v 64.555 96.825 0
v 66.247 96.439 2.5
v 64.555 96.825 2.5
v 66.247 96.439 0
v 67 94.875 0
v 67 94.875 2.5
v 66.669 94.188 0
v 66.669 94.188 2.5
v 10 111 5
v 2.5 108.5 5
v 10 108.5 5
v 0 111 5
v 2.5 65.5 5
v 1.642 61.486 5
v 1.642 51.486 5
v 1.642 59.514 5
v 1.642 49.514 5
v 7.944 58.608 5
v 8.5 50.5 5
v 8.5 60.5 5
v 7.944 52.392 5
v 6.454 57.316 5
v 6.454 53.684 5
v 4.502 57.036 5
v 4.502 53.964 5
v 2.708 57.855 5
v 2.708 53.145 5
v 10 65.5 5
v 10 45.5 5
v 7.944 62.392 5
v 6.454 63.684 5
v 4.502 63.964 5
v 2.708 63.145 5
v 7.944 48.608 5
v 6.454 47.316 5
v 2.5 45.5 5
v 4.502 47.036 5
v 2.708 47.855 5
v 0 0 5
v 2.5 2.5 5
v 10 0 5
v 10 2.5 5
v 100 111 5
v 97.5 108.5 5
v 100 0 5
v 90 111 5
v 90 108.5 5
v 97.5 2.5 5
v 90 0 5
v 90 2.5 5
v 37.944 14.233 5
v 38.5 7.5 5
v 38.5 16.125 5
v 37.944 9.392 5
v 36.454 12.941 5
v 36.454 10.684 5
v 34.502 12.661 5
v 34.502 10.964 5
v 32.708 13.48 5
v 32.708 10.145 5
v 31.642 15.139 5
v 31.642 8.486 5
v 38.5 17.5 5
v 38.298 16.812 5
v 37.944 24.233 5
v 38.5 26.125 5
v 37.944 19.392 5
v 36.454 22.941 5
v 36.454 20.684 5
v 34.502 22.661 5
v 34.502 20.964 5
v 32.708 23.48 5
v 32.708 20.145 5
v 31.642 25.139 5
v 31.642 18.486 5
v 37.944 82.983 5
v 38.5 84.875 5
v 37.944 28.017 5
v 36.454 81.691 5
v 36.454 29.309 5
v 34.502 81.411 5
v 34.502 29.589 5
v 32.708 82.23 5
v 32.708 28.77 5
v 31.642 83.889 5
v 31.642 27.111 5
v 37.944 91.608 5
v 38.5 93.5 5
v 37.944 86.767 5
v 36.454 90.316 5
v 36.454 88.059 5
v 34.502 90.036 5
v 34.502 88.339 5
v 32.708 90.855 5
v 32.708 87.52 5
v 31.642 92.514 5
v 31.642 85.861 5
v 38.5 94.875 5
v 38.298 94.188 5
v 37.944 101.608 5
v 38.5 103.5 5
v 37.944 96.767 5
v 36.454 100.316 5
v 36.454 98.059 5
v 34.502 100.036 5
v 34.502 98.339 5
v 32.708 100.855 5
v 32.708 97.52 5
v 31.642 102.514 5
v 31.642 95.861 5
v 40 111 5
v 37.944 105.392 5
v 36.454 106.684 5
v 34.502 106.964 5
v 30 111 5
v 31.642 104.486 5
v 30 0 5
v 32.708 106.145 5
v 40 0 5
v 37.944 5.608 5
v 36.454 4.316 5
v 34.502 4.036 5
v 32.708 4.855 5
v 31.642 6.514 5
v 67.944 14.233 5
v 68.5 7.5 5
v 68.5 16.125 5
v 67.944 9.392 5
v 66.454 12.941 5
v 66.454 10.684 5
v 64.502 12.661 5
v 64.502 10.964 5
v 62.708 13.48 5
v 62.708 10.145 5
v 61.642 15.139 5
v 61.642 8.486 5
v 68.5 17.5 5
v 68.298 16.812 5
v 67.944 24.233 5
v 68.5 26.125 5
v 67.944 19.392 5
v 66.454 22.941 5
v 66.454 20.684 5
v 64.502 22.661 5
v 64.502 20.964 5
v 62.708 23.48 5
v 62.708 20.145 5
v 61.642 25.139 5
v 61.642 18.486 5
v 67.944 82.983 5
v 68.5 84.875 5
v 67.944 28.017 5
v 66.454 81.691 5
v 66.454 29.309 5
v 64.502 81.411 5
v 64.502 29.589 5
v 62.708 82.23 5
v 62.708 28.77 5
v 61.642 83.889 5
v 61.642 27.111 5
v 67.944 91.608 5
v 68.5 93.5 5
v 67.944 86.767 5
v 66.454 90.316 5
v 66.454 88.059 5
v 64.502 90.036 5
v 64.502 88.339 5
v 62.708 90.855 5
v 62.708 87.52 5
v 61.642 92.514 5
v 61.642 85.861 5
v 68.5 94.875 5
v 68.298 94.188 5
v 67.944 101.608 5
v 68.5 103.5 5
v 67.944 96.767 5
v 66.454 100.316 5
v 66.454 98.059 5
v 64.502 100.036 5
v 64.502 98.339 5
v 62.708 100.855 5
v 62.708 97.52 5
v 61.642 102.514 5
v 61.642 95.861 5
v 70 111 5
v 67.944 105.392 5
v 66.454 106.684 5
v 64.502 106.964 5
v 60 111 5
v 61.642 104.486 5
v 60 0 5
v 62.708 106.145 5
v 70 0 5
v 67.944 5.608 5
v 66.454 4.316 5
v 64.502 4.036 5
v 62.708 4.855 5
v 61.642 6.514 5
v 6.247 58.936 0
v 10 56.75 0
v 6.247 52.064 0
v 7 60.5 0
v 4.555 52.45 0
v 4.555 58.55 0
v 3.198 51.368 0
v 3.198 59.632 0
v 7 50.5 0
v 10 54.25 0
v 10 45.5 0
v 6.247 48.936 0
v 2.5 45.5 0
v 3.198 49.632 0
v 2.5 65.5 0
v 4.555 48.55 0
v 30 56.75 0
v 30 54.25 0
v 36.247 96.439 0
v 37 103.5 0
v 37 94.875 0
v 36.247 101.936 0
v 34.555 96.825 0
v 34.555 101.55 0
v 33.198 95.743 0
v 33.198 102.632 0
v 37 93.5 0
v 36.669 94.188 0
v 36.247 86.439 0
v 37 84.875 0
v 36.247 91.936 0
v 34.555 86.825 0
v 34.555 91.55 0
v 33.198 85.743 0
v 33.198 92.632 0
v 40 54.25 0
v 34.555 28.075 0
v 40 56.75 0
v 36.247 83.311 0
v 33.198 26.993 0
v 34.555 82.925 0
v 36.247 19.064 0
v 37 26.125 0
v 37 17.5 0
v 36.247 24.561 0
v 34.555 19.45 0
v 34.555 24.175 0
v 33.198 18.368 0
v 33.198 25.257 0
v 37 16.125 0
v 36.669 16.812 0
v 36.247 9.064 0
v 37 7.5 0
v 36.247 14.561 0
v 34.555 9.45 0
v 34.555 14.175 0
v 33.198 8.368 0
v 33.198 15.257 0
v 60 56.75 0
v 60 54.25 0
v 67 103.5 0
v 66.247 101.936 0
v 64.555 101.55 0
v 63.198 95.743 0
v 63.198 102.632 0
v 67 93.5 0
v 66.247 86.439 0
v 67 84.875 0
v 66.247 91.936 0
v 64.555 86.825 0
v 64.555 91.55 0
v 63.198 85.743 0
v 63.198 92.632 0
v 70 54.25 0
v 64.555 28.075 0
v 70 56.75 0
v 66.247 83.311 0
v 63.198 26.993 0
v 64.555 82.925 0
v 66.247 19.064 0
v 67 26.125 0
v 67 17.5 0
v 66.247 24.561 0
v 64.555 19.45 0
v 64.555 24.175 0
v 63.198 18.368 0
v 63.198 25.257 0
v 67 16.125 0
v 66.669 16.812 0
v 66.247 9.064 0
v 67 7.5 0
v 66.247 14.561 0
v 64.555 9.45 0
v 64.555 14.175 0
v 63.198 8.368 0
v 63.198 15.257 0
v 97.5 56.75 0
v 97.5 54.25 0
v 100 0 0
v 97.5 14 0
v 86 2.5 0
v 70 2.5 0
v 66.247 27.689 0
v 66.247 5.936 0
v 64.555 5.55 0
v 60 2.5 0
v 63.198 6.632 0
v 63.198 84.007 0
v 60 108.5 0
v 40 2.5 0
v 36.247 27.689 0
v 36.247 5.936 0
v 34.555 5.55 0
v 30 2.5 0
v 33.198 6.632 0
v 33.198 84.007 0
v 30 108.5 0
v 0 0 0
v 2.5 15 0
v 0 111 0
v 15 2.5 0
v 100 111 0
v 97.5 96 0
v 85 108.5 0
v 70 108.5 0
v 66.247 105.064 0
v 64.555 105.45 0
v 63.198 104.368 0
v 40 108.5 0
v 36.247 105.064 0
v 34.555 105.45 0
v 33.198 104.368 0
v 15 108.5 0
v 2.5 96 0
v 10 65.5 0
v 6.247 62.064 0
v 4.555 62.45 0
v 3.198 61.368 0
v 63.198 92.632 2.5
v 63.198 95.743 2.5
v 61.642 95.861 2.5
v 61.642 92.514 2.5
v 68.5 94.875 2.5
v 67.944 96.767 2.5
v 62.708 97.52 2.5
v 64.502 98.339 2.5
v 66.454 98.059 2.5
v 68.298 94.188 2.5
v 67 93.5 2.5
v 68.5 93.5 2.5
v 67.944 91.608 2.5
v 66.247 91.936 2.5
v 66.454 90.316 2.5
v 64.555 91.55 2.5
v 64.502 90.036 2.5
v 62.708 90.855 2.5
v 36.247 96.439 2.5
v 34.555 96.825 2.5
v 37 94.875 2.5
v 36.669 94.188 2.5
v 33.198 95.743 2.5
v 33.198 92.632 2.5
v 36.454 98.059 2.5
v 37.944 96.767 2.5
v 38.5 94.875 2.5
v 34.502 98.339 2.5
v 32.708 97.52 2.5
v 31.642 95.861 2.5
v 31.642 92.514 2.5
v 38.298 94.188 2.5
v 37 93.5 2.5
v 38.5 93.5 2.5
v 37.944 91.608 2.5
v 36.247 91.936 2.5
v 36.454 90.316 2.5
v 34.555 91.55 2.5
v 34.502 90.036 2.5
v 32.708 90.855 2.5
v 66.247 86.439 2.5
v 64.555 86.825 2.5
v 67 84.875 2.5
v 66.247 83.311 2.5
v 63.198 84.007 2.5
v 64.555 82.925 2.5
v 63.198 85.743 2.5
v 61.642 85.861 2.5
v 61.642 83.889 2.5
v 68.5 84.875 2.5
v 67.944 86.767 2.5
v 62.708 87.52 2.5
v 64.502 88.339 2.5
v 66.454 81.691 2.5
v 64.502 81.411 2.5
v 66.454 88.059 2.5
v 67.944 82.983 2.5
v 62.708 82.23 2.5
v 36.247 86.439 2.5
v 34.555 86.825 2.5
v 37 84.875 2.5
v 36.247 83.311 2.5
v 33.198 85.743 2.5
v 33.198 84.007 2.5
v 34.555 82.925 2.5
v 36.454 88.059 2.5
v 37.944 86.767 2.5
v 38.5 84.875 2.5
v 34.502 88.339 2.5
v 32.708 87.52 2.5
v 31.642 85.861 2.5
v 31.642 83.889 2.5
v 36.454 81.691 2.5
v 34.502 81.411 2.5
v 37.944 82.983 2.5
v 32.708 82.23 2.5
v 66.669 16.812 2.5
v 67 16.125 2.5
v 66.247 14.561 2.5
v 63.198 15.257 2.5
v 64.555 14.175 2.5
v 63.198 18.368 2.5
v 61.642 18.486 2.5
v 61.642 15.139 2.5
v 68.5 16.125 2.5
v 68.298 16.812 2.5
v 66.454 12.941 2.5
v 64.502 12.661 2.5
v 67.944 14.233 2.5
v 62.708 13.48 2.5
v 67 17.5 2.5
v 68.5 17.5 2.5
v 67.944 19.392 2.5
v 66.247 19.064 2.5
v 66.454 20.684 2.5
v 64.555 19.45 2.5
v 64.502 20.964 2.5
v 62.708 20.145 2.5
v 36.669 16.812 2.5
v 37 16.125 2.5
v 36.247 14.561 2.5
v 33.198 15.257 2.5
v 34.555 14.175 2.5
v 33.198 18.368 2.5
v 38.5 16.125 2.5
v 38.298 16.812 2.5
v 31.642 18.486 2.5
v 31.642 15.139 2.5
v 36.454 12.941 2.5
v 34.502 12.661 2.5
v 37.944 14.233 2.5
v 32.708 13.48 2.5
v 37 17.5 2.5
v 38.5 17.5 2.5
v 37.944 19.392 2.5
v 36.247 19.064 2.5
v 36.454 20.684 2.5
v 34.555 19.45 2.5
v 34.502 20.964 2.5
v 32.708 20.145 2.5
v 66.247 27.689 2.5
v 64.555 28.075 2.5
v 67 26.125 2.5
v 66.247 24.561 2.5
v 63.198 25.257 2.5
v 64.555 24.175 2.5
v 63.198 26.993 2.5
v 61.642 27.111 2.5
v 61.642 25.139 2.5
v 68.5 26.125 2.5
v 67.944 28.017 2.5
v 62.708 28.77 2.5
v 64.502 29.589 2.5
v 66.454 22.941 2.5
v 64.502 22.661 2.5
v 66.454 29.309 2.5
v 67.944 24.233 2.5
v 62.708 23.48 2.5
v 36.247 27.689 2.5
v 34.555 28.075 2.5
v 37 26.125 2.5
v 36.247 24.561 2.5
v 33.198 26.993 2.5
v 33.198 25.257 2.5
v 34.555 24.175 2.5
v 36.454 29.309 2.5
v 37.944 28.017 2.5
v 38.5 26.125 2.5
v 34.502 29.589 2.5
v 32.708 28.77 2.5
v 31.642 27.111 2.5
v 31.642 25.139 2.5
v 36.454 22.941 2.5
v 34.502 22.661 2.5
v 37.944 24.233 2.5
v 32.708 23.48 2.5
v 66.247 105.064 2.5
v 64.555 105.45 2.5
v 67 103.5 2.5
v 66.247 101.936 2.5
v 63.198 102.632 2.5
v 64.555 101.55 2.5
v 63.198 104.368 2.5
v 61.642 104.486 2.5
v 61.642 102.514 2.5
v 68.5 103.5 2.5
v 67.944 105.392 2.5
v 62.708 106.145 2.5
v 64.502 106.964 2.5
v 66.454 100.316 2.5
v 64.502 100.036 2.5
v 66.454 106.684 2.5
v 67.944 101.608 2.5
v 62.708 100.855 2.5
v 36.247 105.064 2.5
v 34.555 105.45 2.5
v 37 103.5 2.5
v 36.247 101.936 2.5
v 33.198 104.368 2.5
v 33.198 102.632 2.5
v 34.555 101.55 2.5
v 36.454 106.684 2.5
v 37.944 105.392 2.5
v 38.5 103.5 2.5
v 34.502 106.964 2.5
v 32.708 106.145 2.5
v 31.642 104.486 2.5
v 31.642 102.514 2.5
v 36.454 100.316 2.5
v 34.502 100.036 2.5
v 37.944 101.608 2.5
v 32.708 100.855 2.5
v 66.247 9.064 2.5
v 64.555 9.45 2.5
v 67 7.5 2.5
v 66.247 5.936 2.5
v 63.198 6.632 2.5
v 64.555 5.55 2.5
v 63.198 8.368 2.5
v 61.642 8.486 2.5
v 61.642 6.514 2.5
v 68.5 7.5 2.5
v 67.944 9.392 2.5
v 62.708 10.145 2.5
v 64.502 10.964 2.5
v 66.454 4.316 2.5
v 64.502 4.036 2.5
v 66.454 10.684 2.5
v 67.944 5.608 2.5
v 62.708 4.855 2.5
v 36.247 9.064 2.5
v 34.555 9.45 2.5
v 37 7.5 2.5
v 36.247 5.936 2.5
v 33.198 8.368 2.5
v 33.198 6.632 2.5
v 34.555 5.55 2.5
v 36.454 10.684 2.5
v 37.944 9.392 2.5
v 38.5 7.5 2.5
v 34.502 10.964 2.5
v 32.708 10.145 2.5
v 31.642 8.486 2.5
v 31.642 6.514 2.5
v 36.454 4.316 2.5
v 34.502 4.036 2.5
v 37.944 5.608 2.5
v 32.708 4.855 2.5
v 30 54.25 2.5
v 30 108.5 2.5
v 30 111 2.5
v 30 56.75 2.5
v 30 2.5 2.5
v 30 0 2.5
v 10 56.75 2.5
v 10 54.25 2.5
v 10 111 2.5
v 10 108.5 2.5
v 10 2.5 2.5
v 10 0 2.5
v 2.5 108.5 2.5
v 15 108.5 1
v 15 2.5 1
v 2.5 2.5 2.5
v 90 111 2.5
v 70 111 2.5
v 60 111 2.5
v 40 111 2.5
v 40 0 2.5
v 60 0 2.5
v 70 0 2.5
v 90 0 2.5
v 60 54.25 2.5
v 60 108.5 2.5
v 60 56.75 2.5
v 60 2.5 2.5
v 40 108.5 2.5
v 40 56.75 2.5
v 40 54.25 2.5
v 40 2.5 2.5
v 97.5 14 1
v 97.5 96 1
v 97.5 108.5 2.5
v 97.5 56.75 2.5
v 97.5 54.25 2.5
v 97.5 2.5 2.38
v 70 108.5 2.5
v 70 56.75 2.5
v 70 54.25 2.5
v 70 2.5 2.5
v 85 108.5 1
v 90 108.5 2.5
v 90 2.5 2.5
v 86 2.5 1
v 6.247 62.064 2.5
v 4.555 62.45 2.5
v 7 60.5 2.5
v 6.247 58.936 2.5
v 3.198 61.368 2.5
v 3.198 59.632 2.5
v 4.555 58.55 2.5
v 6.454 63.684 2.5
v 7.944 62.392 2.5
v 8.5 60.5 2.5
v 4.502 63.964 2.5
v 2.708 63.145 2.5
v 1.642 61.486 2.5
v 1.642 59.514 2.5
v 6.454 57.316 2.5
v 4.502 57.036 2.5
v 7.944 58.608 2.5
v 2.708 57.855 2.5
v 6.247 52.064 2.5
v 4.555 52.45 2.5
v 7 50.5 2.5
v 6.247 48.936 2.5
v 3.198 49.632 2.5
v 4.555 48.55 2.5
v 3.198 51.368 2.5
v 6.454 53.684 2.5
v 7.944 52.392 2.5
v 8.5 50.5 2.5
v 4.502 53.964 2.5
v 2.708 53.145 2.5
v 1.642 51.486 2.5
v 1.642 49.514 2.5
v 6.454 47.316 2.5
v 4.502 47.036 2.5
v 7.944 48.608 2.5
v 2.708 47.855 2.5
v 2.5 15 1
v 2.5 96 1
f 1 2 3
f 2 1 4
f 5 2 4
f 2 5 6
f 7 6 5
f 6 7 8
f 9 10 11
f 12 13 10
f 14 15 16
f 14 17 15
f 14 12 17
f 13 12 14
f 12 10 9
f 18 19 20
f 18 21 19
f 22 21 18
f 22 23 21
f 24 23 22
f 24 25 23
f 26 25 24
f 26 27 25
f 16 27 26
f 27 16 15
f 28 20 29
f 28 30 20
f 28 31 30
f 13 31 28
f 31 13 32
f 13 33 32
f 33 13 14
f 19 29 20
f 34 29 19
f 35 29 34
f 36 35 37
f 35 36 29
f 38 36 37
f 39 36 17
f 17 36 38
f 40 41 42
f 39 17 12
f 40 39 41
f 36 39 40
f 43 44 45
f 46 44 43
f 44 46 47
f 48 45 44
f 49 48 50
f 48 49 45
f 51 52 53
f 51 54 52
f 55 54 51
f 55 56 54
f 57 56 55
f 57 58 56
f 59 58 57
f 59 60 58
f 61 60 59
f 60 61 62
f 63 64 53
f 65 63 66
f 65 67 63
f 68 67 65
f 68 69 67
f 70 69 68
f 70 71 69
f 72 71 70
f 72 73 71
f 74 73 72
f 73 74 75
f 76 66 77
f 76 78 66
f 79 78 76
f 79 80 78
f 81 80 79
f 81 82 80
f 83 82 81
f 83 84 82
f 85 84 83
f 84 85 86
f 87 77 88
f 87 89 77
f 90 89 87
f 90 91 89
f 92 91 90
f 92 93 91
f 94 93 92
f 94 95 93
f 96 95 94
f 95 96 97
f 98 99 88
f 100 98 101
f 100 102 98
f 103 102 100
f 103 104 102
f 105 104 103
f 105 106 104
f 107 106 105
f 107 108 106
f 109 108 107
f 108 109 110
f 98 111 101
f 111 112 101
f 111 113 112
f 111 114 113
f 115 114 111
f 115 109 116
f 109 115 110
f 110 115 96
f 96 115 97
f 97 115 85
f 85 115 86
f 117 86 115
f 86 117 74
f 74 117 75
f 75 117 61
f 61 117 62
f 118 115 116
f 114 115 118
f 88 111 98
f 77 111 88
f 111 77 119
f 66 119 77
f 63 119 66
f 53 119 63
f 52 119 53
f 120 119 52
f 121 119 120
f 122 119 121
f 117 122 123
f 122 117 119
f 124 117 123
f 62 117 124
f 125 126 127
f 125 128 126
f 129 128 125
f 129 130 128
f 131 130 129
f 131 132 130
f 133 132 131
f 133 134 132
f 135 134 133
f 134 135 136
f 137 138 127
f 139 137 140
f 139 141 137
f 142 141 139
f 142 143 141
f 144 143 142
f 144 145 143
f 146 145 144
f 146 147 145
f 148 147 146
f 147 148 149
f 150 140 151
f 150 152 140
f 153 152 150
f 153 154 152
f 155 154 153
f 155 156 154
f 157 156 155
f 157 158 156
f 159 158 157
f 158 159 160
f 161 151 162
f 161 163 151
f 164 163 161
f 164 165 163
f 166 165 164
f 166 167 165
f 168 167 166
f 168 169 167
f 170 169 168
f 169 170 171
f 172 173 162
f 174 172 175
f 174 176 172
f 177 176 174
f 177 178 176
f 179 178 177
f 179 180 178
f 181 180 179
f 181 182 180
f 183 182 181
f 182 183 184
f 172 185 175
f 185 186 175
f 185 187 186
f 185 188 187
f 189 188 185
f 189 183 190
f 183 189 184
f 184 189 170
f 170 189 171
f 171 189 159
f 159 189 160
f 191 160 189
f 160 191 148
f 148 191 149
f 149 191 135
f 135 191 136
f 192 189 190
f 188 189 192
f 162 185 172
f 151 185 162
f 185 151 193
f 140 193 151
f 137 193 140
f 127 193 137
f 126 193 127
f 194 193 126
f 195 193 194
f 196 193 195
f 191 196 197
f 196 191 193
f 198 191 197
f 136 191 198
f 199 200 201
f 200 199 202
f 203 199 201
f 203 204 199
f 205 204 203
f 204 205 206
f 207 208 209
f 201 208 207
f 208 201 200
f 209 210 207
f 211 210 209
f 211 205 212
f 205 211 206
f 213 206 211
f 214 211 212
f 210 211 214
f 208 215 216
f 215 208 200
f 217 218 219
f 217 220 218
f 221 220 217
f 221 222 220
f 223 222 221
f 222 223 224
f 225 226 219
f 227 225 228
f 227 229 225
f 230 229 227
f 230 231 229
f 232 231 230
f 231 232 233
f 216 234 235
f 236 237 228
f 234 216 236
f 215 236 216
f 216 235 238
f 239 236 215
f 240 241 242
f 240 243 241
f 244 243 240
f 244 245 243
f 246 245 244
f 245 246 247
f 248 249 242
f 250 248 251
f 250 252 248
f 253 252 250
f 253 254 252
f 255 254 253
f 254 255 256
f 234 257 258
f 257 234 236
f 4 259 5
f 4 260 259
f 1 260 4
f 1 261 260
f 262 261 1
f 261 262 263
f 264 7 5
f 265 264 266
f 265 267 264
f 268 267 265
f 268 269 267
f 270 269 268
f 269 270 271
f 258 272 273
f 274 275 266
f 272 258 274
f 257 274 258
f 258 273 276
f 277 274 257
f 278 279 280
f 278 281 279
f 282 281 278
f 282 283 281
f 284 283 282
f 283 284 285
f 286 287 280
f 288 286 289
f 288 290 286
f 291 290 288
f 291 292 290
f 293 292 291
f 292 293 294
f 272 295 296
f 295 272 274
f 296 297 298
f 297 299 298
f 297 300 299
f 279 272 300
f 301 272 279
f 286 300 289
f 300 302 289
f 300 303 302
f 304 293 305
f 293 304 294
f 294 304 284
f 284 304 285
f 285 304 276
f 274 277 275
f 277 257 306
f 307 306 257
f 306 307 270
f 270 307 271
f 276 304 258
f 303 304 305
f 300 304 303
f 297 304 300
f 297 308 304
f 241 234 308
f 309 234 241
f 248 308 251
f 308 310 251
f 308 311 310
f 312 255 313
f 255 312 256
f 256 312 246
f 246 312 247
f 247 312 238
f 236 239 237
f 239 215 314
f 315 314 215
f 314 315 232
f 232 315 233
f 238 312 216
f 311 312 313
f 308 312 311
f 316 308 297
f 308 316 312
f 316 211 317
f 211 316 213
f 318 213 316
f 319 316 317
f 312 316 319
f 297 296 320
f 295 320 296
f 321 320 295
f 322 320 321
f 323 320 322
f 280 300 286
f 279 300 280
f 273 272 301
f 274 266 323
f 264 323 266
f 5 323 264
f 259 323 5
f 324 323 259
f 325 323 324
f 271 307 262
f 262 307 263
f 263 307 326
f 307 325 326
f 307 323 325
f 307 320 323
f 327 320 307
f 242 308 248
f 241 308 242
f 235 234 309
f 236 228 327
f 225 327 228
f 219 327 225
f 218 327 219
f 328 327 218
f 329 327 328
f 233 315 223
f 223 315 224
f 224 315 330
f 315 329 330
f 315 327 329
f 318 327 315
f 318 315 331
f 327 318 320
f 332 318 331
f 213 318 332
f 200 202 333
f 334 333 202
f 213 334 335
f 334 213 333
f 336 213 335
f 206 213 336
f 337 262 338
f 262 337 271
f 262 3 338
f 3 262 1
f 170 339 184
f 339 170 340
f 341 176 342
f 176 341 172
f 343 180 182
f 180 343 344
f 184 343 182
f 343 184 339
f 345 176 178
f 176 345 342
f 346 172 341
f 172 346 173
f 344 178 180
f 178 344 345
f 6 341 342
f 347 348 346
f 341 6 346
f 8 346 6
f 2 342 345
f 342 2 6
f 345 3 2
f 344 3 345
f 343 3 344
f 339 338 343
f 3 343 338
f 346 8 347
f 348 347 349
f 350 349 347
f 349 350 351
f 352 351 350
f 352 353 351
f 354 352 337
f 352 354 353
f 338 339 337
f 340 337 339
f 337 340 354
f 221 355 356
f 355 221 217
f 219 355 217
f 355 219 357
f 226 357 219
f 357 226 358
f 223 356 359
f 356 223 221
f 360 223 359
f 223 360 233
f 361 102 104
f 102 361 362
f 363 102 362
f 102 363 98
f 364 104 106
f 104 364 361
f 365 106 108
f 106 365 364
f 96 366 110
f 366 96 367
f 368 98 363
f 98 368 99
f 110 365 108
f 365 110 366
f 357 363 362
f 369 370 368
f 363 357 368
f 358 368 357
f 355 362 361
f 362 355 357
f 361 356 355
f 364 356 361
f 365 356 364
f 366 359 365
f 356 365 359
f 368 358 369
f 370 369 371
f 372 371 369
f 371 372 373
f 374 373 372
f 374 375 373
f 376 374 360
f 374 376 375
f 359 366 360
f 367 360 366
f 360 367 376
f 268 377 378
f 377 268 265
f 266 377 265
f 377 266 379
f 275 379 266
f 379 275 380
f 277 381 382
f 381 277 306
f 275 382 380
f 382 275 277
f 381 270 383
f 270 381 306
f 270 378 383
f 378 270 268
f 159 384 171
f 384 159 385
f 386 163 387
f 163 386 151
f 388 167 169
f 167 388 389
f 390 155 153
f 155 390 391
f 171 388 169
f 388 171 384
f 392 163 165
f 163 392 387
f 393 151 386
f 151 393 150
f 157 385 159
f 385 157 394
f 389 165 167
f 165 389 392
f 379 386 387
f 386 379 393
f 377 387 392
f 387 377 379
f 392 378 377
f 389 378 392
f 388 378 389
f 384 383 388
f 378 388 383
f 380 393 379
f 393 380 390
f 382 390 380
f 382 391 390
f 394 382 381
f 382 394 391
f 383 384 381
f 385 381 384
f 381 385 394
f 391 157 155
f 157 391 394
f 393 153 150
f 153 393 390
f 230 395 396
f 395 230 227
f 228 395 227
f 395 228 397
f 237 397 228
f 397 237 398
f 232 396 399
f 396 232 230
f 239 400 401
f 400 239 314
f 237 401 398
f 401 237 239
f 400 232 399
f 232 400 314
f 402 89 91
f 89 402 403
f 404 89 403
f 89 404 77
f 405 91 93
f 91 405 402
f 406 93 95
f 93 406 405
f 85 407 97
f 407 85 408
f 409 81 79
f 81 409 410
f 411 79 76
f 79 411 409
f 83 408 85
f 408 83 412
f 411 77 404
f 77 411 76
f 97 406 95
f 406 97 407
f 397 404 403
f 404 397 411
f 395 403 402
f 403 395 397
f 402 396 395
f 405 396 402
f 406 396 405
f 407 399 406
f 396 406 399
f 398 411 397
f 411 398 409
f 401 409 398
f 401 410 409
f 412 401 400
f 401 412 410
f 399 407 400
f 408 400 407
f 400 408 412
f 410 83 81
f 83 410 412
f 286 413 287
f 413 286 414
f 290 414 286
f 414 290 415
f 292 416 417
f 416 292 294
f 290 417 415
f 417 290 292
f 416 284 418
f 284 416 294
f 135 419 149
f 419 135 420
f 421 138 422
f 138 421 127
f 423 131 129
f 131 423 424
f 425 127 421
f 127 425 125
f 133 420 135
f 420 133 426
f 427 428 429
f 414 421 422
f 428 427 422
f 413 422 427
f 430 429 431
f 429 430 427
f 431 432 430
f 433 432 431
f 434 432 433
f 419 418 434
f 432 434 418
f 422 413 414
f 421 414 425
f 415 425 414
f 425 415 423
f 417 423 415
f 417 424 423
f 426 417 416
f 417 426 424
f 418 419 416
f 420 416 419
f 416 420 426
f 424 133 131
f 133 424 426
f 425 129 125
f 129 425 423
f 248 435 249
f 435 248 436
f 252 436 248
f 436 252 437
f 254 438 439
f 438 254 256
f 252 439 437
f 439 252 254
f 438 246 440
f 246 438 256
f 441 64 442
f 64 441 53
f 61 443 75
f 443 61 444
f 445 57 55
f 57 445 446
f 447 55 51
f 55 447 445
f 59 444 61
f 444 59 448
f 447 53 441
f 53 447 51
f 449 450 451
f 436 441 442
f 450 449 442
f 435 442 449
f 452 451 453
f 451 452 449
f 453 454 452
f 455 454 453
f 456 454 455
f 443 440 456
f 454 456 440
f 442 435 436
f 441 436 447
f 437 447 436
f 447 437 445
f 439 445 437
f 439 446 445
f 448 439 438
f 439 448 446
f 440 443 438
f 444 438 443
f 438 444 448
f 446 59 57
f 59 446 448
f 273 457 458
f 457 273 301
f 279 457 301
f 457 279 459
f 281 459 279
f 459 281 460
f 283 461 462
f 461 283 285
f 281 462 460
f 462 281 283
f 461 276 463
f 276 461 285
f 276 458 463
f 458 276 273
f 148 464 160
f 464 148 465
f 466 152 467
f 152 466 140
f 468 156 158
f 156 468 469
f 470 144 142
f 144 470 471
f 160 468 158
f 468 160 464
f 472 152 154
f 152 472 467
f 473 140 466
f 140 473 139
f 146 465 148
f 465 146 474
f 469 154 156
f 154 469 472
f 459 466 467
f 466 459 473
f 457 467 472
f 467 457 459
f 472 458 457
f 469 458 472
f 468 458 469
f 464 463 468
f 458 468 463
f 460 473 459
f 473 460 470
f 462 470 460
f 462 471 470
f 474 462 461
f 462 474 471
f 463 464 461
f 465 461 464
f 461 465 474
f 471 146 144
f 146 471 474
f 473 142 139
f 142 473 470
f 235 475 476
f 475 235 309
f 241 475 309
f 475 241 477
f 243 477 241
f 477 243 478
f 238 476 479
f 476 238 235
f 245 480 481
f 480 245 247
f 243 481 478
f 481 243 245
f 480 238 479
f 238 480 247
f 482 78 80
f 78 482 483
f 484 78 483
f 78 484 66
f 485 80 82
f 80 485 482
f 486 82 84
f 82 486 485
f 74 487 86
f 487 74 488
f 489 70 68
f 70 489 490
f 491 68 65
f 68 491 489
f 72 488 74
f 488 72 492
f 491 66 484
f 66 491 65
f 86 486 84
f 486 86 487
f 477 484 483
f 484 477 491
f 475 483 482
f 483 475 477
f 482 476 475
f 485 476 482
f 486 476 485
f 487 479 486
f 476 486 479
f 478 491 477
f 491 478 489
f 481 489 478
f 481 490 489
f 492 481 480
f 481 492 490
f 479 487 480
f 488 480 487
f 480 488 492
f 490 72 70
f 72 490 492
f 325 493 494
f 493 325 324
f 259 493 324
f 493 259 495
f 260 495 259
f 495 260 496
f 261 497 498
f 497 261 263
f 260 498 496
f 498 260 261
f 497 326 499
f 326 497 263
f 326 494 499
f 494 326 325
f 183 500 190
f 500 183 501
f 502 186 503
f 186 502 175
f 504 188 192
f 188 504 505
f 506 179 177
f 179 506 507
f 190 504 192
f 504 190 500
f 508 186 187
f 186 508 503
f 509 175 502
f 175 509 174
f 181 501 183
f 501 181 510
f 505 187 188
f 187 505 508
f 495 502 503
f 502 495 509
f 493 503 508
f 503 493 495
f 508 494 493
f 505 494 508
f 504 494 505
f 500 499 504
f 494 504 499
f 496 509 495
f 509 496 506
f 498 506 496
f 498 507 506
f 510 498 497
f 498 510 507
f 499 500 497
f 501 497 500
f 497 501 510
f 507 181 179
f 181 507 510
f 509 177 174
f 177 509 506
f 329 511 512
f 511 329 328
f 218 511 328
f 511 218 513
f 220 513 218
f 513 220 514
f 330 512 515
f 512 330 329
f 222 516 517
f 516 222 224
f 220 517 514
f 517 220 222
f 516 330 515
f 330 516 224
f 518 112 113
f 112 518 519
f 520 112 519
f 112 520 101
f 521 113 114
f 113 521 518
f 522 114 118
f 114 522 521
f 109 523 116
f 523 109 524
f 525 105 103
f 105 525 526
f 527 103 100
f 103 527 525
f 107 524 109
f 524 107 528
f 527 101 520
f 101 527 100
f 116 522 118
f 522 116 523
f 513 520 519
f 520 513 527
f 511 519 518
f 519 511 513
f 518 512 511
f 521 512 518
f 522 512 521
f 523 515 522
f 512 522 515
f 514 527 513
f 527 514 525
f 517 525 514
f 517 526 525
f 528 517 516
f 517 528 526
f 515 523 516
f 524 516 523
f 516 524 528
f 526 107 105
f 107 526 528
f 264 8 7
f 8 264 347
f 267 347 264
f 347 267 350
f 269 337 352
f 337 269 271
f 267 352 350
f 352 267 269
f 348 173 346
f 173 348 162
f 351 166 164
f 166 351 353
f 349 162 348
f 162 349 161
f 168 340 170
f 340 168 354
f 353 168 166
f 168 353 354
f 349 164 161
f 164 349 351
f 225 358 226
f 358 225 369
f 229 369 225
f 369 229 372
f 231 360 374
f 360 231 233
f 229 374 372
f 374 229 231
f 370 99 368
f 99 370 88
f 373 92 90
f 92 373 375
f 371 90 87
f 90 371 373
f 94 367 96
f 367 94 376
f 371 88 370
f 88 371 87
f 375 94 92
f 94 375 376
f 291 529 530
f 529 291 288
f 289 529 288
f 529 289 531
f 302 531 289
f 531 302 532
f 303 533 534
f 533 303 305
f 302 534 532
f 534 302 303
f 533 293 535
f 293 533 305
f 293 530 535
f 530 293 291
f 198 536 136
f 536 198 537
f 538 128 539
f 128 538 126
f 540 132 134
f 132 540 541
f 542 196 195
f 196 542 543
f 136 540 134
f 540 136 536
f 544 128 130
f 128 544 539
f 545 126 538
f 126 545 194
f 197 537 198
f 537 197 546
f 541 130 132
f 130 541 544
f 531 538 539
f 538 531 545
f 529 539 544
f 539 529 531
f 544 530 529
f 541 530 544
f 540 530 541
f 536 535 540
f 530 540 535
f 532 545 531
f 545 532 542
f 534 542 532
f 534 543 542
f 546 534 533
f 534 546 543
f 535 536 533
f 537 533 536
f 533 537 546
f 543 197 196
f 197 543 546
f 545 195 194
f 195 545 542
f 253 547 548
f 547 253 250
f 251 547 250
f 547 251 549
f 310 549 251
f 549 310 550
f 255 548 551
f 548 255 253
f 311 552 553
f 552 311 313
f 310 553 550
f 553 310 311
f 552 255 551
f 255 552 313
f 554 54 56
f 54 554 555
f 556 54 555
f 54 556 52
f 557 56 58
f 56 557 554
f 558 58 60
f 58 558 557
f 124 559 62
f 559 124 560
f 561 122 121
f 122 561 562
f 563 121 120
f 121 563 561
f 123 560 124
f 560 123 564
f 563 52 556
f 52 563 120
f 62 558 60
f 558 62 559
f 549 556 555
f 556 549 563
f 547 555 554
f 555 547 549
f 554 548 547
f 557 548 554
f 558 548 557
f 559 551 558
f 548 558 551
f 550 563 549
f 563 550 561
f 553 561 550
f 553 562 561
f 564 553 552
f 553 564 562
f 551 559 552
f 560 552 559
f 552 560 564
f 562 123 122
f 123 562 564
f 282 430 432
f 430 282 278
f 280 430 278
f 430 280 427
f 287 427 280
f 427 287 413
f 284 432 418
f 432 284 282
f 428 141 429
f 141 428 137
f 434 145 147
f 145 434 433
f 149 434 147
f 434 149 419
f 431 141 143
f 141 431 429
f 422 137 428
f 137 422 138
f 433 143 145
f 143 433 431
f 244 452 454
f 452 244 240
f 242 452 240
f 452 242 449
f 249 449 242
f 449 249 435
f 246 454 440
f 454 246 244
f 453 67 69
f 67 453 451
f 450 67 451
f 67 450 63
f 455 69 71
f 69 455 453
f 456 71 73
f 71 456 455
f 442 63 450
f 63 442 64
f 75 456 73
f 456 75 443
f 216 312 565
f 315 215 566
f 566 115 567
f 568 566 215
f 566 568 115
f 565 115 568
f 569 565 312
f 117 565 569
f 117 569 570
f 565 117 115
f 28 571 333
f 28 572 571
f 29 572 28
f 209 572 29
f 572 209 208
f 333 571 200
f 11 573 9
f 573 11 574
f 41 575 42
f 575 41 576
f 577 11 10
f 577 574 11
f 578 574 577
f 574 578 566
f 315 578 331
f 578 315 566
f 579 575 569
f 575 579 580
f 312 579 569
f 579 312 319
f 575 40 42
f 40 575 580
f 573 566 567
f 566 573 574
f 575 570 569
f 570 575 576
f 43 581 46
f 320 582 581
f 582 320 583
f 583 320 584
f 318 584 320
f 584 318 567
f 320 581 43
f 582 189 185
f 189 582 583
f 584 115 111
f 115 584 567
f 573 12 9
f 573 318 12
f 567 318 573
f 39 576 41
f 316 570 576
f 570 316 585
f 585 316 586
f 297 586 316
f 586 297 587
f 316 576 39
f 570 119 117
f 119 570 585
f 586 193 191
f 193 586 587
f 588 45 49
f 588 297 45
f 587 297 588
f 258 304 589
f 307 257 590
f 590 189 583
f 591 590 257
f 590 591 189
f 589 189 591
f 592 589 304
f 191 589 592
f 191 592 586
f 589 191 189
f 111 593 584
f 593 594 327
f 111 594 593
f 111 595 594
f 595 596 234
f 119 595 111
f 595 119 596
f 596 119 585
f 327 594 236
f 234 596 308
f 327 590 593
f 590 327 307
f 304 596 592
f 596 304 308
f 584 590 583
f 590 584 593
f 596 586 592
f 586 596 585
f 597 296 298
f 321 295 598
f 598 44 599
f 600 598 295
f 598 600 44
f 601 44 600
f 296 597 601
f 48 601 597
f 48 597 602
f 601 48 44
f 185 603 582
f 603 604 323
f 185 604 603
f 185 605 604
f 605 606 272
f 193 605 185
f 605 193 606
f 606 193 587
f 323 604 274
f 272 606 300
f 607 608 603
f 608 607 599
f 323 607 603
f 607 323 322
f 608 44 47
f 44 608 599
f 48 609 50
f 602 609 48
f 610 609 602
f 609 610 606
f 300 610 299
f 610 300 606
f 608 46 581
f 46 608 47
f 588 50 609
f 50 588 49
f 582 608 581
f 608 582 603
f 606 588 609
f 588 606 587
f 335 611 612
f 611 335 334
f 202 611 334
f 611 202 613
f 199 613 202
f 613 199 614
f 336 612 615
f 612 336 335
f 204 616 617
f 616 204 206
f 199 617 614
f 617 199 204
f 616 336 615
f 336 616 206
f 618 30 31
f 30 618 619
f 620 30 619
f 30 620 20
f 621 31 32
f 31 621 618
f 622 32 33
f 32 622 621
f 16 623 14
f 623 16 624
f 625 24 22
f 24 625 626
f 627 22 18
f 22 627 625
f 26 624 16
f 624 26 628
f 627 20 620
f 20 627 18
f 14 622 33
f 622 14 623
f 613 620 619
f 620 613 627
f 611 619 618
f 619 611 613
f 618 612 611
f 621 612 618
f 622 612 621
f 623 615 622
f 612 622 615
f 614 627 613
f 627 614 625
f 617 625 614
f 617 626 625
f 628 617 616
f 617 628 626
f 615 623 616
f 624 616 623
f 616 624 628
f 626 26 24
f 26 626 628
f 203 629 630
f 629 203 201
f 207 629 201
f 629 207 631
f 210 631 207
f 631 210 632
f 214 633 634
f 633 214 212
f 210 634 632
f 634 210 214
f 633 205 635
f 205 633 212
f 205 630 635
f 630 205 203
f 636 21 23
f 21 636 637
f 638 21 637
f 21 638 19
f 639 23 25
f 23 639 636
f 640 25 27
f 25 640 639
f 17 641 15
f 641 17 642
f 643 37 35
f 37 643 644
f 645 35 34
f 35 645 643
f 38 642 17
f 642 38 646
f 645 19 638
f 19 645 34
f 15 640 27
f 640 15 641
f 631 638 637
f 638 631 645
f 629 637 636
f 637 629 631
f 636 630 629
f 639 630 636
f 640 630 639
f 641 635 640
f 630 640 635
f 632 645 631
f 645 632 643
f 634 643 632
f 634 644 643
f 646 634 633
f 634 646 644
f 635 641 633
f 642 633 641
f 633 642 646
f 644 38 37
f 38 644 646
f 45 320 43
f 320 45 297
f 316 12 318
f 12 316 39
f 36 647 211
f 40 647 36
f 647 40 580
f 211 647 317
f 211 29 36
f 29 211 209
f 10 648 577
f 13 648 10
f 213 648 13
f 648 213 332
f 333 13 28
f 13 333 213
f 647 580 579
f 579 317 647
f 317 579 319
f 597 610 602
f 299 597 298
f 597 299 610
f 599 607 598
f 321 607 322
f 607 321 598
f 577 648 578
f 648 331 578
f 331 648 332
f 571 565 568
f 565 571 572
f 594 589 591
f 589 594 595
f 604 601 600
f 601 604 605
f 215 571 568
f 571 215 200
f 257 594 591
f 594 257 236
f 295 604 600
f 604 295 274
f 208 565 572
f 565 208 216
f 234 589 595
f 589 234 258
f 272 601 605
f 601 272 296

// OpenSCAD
widths = [68.25,85.5];
max_width = 85.5;
bottom_width = max_width + 25.5;
middle = bottom_width / 2;
difference() {
  cube ([100,bottom_width ,5]);

  for ( w = widths ){
    for ( y = [ middle + (w/2) - 7 + 12.25,
                middle + (w/2) - 17 + 12.25, 
                middle - (w/2) + 7 - 12.25, 
                middle - (w/2) + 17 - 12.25] ) {
      translate([35,y,0]){
        cylinder(h=5, r=2);
		  translate([0,0,2.5]){
          cylinder(h=2.5, r=3.5);
        }
        translate([30,0,0]){
          cylinder(h=5, r=2);
			 translate([0,0,2.5]){
            cylinder(h=2.5, r=3.5);
          }
        }
      }
    }
  }
  translate([10,2.5,0]){
    cube ([20,bottom_width - 5,5]);
	 translate([0,-2.5,2.5]){
      cube ([20,bottom_width,2.5]);
    }
  }
  translate([2.5,2.5,0]){
    cube ([20,middle - 12.5,5]);
  }
  translate([2.5,middle + 10,0]){
    cube ([20,middle - 12.5,5]);
  }
  translate([40,2.5,0]){
    cube ([20,bottom_width - 5,5]);
	 translate([0,-2.5,2.5]){
      cube ([20,bottom_width,2.5]);
    }
  }
  translate([70,2.5,0]){
    cube ([27.5,bottom_width - 5,5]);
	 translate([0,-2.5,2.5]){
      cube ([20,bottom_width,2.5]);
    }
  }


  translate([5,middle - 5,0]){
    cylinder(h=5, r=2);
	 translate([0,0,2.5]){
      cylinder(h=2.5, r=3.5);
    }
    translate([0,10,0]){
      cylinder(h=5, r=2);
      translate([0,0,2.5]){
        cylinder(h=2.5, r=3.5);
      }
    }
  }
  
}
translate([10,middle - 1.25,0]){
  cube([90,2.5,2.5]);
}

for ( m = [[[1,0,0,0],
               [0,1,0,0],
					[0,0,1,0],
					[0,0,0,1]],
           [[cos(90),-sin(90),0,bottom_width - 10],
               [sin(90),cos(90),0,0],
					[0,0,1,0],
					[0,0,0,1]],
           [[cos(180),-sin(180),0,bottom_width - 11],
               [sin(180),cos(180),0,100 + 11],
					[0,0,1,0],
					[0,0,0,1]],
           [[cos(270),-sin(270),0],
               [sin(270),cos(270),0,100 + 11],
					[0,0,1,0],
					[0,0,0,1]]]
    ){
multmatrix( m= m ){
  polyhedron(
    points=[ [2.5,2.5,0],   //0 origin
             [2.5,15,0],   //1 out y low
             [15,2.5,0],   //2 out x low
             [2.5,2.5,2.5], //3 tip
             [2.5,15,1], //4 out y high
             [15,2.5,1] ], //5 out x high
    triangles=[ [4,2,5], [4,1,2], [3,4,5], [2,1,0],
					 [3,5,2], [1,4,0], [0,4,3], [0,3,2]  ]
  );
}
}
